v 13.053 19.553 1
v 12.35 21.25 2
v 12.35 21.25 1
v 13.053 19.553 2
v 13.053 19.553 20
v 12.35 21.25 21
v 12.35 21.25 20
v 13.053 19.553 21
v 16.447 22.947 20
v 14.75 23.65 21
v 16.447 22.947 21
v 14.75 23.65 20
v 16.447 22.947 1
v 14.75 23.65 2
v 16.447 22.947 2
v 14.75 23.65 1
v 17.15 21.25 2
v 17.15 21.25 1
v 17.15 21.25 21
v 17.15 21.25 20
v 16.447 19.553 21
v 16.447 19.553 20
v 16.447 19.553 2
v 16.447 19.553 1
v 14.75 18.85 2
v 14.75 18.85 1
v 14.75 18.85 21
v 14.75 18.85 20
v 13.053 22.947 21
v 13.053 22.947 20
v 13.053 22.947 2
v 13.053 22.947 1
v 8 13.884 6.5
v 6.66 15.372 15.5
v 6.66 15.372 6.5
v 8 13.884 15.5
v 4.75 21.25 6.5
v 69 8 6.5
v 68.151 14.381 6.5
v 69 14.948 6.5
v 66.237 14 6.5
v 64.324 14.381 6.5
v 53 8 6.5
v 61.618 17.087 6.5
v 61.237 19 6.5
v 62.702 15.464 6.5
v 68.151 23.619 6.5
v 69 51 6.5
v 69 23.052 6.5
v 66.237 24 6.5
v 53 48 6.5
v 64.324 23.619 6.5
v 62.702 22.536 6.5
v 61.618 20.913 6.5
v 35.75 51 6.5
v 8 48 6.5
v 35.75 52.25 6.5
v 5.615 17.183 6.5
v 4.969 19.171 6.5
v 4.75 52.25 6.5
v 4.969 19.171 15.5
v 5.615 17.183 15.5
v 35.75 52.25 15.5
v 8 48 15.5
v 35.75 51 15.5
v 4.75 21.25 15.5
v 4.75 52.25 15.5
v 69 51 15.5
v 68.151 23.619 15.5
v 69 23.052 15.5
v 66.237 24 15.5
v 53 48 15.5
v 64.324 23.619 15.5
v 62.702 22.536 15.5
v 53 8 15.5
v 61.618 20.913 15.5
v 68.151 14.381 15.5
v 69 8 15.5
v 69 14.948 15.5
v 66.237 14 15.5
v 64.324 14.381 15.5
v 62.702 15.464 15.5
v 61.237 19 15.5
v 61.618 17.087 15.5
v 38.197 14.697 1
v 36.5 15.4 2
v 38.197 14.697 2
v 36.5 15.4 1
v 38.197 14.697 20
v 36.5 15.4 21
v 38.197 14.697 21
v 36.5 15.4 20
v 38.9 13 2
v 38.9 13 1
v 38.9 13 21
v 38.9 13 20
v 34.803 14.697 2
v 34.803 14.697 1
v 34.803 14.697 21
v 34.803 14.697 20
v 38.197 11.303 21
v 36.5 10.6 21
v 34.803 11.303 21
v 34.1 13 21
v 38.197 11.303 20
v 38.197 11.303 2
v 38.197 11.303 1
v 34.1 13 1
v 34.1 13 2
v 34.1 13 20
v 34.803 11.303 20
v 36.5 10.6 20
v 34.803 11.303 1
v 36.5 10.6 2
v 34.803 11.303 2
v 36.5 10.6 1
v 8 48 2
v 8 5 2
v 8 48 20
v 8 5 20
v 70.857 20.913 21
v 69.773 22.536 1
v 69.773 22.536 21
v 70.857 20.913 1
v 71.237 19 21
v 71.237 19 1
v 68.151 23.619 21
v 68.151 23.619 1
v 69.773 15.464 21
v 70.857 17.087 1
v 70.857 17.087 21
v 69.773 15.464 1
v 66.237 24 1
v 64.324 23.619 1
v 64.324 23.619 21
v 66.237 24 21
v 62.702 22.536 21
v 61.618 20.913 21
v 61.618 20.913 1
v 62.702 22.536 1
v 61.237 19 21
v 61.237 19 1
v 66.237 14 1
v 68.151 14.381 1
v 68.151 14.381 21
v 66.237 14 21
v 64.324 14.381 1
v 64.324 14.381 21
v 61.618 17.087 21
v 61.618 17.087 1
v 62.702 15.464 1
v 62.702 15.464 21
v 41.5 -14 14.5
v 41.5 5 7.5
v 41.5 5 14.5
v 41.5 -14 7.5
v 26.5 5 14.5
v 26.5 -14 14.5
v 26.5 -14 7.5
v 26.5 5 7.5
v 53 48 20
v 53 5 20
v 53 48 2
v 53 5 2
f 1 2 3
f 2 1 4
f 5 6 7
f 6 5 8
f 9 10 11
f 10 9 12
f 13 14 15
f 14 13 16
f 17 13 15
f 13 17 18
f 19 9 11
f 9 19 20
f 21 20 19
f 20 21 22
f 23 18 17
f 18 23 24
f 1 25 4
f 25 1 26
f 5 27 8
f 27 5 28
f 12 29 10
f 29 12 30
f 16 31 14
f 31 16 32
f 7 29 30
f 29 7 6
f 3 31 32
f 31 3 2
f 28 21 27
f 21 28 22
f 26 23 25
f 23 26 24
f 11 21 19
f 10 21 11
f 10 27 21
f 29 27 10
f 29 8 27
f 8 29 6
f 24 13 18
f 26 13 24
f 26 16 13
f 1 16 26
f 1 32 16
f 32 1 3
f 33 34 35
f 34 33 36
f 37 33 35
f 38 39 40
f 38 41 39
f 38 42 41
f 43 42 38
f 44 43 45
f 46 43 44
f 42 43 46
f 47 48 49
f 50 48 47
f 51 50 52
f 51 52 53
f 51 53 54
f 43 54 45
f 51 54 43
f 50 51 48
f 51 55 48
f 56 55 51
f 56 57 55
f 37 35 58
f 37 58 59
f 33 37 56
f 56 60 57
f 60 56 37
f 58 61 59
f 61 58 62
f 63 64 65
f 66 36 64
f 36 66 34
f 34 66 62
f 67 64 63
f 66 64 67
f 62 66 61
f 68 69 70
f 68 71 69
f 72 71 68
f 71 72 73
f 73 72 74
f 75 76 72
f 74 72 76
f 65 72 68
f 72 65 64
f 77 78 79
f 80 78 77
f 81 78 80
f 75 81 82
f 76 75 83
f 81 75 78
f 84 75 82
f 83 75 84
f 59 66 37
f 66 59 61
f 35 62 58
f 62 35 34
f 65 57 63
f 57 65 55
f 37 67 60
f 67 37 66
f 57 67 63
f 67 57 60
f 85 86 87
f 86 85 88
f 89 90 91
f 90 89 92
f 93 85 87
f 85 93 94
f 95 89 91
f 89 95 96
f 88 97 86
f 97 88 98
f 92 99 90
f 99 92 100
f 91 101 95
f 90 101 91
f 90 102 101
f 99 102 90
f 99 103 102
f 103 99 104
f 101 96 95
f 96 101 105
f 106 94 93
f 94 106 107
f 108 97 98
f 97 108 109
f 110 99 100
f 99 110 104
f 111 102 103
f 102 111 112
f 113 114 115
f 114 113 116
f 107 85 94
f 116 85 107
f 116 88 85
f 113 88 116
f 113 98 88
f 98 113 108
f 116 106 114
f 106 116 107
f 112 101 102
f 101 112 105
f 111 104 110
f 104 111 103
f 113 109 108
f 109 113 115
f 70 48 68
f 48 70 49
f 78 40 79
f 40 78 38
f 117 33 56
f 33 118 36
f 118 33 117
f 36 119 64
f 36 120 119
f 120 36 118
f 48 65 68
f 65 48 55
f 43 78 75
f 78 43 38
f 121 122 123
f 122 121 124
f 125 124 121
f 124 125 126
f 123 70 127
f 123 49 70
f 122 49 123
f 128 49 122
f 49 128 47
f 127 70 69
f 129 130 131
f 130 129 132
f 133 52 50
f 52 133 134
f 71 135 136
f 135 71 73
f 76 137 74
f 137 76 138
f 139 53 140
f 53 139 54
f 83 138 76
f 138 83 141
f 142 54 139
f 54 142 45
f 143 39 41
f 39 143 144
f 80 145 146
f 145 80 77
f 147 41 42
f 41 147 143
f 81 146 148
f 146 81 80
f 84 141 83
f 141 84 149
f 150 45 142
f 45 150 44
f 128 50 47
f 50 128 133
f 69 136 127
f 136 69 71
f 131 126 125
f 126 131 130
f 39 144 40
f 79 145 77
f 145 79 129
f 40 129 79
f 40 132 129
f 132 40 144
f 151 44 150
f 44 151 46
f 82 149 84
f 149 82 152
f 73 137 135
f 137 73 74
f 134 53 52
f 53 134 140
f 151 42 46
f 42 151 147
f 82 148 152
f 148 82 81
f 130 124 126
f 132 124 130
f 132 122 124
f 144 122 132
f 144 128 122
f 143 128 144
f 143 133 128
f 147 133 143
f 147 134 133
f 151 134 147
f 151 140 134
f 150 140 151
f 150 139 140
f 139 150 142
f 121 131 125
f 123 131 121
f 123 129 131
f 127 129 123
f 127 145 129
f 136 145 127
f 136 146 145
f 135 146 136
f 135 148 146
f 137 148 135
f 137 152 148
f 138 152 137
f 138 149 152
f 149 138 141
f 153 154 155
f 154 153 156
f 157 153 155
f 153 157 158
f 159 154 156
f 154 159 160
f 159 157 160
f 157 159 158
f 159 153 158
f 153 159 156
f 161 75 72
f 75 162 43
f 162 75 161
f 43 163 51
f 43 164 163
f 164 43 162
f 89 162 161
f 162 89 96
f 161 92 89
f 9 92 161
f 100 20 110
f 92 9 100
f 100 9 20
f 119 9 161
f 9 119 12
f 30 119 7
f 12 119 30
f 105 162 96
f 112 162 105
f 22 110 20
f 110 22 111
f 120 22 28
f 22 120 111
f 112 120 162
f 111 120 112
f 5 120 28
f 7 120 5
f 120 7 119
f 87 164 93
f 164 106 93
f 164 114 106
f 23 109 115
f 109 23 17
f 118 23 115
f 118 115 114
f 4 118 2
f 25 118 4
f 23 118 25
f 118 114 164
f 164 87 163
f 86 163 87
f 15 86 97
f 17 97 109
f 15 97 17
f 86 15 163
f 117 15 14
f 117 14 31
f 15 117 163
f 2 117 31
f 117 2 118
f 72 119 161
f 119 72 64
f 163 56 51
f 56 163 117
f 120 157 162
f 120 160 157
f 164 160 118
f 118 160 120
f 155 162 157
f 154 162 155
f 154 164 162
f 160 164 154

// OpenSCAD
module AR15_Trigger(pinWidth=20,
                   triggerPin=true, hammerPin=true,
                   selector=true,
                   triggerHole=false,
                   triggerPocketModifier=0) {

  pinRadius = 2.4; // 0.1560*25.4/2;

  frontPinOffsetX = 6.75;
  frontPinOffsetY = 16.25;

  rearPinOffsetX = 28.5;
  rearPinOffsetY = 8;

  selectorRadius = 5; // Diameter: .3760" = 9.55mm
  selectorOffsetX = frontPinOffsetX+(1.968*25.4) + 1.5;
  selectorOffsetY = 14;

  hammerLength = 41 + triggerPocketModifier;
  hammerWidth  = 9  + triggerPocketModifier;
  hammerPivotRadius = 10 + triggerPocketModifier;

  triggerWidth      = 7;

  triggerPocketHeight = 43 + triggerPocketModifier;
  triggerPocketWidth  = 18 + triggerPocketModifier;
  triggerPocketLength = 45 + triggerPocketModifier;

  render()
  difference() {
    union() {

      // Trigger pack body
      cube([triggerPocketLength,triggerPocketHeight,triggerPocketWidth]);

      translate([0,0,triggerPocketWidth/2]) {

        // Pins and hammer path
        translate([frontPinOffsetX,frontPinOffsetY,0]) {

          // Hammer pin
          if (hammerPin)
          cylinder(r=pinRadius, h=pinWidth, center=true);

          // Hammer pivot
          cylinder(r=hammerPivotRadius, h=hammerWidth, center=true);

          // Hammer travel
          translate([-hammerPivotRadius,0,-hammerWidth/2])
          cube([hammerLength-hammerPivotRadius,hammerLength-hammerPivotRadius,hammerWidth]);
        };

        // Trigger pin
        if (triggerPin)
        translate([rearPinOffsetX,rearPinOffsetY,0])
        cylinder(r=pinRadius, h=pinWidth, center=true);

        // Sear Extension
        translate([0,3,0-hammerWidth/2])
        cube([triggerPocketLength+16,triggerPocketHeight,hammerWidth]);

        // Selector
        if (selector)
        translate([selectorOffsetX,selectorOffsetY,0])
        cylinder(r=selectorRadius, h=pinWidth, center=true);

        // Trigger
        translate([rearPinOffsetX - 10,-19,-3.5])
        cube([15,20,7]);
      }
    }

    if (triggerHole) {
      translate([0,0,triggerPocketWidth/2])
      translate([rearPinOffsetX - 10,-19,-3.5])
      cube([15,40+triggerPocketHeight,7]);
    }
  }
}

translate([8,5,2])
AR15_Trigger();
